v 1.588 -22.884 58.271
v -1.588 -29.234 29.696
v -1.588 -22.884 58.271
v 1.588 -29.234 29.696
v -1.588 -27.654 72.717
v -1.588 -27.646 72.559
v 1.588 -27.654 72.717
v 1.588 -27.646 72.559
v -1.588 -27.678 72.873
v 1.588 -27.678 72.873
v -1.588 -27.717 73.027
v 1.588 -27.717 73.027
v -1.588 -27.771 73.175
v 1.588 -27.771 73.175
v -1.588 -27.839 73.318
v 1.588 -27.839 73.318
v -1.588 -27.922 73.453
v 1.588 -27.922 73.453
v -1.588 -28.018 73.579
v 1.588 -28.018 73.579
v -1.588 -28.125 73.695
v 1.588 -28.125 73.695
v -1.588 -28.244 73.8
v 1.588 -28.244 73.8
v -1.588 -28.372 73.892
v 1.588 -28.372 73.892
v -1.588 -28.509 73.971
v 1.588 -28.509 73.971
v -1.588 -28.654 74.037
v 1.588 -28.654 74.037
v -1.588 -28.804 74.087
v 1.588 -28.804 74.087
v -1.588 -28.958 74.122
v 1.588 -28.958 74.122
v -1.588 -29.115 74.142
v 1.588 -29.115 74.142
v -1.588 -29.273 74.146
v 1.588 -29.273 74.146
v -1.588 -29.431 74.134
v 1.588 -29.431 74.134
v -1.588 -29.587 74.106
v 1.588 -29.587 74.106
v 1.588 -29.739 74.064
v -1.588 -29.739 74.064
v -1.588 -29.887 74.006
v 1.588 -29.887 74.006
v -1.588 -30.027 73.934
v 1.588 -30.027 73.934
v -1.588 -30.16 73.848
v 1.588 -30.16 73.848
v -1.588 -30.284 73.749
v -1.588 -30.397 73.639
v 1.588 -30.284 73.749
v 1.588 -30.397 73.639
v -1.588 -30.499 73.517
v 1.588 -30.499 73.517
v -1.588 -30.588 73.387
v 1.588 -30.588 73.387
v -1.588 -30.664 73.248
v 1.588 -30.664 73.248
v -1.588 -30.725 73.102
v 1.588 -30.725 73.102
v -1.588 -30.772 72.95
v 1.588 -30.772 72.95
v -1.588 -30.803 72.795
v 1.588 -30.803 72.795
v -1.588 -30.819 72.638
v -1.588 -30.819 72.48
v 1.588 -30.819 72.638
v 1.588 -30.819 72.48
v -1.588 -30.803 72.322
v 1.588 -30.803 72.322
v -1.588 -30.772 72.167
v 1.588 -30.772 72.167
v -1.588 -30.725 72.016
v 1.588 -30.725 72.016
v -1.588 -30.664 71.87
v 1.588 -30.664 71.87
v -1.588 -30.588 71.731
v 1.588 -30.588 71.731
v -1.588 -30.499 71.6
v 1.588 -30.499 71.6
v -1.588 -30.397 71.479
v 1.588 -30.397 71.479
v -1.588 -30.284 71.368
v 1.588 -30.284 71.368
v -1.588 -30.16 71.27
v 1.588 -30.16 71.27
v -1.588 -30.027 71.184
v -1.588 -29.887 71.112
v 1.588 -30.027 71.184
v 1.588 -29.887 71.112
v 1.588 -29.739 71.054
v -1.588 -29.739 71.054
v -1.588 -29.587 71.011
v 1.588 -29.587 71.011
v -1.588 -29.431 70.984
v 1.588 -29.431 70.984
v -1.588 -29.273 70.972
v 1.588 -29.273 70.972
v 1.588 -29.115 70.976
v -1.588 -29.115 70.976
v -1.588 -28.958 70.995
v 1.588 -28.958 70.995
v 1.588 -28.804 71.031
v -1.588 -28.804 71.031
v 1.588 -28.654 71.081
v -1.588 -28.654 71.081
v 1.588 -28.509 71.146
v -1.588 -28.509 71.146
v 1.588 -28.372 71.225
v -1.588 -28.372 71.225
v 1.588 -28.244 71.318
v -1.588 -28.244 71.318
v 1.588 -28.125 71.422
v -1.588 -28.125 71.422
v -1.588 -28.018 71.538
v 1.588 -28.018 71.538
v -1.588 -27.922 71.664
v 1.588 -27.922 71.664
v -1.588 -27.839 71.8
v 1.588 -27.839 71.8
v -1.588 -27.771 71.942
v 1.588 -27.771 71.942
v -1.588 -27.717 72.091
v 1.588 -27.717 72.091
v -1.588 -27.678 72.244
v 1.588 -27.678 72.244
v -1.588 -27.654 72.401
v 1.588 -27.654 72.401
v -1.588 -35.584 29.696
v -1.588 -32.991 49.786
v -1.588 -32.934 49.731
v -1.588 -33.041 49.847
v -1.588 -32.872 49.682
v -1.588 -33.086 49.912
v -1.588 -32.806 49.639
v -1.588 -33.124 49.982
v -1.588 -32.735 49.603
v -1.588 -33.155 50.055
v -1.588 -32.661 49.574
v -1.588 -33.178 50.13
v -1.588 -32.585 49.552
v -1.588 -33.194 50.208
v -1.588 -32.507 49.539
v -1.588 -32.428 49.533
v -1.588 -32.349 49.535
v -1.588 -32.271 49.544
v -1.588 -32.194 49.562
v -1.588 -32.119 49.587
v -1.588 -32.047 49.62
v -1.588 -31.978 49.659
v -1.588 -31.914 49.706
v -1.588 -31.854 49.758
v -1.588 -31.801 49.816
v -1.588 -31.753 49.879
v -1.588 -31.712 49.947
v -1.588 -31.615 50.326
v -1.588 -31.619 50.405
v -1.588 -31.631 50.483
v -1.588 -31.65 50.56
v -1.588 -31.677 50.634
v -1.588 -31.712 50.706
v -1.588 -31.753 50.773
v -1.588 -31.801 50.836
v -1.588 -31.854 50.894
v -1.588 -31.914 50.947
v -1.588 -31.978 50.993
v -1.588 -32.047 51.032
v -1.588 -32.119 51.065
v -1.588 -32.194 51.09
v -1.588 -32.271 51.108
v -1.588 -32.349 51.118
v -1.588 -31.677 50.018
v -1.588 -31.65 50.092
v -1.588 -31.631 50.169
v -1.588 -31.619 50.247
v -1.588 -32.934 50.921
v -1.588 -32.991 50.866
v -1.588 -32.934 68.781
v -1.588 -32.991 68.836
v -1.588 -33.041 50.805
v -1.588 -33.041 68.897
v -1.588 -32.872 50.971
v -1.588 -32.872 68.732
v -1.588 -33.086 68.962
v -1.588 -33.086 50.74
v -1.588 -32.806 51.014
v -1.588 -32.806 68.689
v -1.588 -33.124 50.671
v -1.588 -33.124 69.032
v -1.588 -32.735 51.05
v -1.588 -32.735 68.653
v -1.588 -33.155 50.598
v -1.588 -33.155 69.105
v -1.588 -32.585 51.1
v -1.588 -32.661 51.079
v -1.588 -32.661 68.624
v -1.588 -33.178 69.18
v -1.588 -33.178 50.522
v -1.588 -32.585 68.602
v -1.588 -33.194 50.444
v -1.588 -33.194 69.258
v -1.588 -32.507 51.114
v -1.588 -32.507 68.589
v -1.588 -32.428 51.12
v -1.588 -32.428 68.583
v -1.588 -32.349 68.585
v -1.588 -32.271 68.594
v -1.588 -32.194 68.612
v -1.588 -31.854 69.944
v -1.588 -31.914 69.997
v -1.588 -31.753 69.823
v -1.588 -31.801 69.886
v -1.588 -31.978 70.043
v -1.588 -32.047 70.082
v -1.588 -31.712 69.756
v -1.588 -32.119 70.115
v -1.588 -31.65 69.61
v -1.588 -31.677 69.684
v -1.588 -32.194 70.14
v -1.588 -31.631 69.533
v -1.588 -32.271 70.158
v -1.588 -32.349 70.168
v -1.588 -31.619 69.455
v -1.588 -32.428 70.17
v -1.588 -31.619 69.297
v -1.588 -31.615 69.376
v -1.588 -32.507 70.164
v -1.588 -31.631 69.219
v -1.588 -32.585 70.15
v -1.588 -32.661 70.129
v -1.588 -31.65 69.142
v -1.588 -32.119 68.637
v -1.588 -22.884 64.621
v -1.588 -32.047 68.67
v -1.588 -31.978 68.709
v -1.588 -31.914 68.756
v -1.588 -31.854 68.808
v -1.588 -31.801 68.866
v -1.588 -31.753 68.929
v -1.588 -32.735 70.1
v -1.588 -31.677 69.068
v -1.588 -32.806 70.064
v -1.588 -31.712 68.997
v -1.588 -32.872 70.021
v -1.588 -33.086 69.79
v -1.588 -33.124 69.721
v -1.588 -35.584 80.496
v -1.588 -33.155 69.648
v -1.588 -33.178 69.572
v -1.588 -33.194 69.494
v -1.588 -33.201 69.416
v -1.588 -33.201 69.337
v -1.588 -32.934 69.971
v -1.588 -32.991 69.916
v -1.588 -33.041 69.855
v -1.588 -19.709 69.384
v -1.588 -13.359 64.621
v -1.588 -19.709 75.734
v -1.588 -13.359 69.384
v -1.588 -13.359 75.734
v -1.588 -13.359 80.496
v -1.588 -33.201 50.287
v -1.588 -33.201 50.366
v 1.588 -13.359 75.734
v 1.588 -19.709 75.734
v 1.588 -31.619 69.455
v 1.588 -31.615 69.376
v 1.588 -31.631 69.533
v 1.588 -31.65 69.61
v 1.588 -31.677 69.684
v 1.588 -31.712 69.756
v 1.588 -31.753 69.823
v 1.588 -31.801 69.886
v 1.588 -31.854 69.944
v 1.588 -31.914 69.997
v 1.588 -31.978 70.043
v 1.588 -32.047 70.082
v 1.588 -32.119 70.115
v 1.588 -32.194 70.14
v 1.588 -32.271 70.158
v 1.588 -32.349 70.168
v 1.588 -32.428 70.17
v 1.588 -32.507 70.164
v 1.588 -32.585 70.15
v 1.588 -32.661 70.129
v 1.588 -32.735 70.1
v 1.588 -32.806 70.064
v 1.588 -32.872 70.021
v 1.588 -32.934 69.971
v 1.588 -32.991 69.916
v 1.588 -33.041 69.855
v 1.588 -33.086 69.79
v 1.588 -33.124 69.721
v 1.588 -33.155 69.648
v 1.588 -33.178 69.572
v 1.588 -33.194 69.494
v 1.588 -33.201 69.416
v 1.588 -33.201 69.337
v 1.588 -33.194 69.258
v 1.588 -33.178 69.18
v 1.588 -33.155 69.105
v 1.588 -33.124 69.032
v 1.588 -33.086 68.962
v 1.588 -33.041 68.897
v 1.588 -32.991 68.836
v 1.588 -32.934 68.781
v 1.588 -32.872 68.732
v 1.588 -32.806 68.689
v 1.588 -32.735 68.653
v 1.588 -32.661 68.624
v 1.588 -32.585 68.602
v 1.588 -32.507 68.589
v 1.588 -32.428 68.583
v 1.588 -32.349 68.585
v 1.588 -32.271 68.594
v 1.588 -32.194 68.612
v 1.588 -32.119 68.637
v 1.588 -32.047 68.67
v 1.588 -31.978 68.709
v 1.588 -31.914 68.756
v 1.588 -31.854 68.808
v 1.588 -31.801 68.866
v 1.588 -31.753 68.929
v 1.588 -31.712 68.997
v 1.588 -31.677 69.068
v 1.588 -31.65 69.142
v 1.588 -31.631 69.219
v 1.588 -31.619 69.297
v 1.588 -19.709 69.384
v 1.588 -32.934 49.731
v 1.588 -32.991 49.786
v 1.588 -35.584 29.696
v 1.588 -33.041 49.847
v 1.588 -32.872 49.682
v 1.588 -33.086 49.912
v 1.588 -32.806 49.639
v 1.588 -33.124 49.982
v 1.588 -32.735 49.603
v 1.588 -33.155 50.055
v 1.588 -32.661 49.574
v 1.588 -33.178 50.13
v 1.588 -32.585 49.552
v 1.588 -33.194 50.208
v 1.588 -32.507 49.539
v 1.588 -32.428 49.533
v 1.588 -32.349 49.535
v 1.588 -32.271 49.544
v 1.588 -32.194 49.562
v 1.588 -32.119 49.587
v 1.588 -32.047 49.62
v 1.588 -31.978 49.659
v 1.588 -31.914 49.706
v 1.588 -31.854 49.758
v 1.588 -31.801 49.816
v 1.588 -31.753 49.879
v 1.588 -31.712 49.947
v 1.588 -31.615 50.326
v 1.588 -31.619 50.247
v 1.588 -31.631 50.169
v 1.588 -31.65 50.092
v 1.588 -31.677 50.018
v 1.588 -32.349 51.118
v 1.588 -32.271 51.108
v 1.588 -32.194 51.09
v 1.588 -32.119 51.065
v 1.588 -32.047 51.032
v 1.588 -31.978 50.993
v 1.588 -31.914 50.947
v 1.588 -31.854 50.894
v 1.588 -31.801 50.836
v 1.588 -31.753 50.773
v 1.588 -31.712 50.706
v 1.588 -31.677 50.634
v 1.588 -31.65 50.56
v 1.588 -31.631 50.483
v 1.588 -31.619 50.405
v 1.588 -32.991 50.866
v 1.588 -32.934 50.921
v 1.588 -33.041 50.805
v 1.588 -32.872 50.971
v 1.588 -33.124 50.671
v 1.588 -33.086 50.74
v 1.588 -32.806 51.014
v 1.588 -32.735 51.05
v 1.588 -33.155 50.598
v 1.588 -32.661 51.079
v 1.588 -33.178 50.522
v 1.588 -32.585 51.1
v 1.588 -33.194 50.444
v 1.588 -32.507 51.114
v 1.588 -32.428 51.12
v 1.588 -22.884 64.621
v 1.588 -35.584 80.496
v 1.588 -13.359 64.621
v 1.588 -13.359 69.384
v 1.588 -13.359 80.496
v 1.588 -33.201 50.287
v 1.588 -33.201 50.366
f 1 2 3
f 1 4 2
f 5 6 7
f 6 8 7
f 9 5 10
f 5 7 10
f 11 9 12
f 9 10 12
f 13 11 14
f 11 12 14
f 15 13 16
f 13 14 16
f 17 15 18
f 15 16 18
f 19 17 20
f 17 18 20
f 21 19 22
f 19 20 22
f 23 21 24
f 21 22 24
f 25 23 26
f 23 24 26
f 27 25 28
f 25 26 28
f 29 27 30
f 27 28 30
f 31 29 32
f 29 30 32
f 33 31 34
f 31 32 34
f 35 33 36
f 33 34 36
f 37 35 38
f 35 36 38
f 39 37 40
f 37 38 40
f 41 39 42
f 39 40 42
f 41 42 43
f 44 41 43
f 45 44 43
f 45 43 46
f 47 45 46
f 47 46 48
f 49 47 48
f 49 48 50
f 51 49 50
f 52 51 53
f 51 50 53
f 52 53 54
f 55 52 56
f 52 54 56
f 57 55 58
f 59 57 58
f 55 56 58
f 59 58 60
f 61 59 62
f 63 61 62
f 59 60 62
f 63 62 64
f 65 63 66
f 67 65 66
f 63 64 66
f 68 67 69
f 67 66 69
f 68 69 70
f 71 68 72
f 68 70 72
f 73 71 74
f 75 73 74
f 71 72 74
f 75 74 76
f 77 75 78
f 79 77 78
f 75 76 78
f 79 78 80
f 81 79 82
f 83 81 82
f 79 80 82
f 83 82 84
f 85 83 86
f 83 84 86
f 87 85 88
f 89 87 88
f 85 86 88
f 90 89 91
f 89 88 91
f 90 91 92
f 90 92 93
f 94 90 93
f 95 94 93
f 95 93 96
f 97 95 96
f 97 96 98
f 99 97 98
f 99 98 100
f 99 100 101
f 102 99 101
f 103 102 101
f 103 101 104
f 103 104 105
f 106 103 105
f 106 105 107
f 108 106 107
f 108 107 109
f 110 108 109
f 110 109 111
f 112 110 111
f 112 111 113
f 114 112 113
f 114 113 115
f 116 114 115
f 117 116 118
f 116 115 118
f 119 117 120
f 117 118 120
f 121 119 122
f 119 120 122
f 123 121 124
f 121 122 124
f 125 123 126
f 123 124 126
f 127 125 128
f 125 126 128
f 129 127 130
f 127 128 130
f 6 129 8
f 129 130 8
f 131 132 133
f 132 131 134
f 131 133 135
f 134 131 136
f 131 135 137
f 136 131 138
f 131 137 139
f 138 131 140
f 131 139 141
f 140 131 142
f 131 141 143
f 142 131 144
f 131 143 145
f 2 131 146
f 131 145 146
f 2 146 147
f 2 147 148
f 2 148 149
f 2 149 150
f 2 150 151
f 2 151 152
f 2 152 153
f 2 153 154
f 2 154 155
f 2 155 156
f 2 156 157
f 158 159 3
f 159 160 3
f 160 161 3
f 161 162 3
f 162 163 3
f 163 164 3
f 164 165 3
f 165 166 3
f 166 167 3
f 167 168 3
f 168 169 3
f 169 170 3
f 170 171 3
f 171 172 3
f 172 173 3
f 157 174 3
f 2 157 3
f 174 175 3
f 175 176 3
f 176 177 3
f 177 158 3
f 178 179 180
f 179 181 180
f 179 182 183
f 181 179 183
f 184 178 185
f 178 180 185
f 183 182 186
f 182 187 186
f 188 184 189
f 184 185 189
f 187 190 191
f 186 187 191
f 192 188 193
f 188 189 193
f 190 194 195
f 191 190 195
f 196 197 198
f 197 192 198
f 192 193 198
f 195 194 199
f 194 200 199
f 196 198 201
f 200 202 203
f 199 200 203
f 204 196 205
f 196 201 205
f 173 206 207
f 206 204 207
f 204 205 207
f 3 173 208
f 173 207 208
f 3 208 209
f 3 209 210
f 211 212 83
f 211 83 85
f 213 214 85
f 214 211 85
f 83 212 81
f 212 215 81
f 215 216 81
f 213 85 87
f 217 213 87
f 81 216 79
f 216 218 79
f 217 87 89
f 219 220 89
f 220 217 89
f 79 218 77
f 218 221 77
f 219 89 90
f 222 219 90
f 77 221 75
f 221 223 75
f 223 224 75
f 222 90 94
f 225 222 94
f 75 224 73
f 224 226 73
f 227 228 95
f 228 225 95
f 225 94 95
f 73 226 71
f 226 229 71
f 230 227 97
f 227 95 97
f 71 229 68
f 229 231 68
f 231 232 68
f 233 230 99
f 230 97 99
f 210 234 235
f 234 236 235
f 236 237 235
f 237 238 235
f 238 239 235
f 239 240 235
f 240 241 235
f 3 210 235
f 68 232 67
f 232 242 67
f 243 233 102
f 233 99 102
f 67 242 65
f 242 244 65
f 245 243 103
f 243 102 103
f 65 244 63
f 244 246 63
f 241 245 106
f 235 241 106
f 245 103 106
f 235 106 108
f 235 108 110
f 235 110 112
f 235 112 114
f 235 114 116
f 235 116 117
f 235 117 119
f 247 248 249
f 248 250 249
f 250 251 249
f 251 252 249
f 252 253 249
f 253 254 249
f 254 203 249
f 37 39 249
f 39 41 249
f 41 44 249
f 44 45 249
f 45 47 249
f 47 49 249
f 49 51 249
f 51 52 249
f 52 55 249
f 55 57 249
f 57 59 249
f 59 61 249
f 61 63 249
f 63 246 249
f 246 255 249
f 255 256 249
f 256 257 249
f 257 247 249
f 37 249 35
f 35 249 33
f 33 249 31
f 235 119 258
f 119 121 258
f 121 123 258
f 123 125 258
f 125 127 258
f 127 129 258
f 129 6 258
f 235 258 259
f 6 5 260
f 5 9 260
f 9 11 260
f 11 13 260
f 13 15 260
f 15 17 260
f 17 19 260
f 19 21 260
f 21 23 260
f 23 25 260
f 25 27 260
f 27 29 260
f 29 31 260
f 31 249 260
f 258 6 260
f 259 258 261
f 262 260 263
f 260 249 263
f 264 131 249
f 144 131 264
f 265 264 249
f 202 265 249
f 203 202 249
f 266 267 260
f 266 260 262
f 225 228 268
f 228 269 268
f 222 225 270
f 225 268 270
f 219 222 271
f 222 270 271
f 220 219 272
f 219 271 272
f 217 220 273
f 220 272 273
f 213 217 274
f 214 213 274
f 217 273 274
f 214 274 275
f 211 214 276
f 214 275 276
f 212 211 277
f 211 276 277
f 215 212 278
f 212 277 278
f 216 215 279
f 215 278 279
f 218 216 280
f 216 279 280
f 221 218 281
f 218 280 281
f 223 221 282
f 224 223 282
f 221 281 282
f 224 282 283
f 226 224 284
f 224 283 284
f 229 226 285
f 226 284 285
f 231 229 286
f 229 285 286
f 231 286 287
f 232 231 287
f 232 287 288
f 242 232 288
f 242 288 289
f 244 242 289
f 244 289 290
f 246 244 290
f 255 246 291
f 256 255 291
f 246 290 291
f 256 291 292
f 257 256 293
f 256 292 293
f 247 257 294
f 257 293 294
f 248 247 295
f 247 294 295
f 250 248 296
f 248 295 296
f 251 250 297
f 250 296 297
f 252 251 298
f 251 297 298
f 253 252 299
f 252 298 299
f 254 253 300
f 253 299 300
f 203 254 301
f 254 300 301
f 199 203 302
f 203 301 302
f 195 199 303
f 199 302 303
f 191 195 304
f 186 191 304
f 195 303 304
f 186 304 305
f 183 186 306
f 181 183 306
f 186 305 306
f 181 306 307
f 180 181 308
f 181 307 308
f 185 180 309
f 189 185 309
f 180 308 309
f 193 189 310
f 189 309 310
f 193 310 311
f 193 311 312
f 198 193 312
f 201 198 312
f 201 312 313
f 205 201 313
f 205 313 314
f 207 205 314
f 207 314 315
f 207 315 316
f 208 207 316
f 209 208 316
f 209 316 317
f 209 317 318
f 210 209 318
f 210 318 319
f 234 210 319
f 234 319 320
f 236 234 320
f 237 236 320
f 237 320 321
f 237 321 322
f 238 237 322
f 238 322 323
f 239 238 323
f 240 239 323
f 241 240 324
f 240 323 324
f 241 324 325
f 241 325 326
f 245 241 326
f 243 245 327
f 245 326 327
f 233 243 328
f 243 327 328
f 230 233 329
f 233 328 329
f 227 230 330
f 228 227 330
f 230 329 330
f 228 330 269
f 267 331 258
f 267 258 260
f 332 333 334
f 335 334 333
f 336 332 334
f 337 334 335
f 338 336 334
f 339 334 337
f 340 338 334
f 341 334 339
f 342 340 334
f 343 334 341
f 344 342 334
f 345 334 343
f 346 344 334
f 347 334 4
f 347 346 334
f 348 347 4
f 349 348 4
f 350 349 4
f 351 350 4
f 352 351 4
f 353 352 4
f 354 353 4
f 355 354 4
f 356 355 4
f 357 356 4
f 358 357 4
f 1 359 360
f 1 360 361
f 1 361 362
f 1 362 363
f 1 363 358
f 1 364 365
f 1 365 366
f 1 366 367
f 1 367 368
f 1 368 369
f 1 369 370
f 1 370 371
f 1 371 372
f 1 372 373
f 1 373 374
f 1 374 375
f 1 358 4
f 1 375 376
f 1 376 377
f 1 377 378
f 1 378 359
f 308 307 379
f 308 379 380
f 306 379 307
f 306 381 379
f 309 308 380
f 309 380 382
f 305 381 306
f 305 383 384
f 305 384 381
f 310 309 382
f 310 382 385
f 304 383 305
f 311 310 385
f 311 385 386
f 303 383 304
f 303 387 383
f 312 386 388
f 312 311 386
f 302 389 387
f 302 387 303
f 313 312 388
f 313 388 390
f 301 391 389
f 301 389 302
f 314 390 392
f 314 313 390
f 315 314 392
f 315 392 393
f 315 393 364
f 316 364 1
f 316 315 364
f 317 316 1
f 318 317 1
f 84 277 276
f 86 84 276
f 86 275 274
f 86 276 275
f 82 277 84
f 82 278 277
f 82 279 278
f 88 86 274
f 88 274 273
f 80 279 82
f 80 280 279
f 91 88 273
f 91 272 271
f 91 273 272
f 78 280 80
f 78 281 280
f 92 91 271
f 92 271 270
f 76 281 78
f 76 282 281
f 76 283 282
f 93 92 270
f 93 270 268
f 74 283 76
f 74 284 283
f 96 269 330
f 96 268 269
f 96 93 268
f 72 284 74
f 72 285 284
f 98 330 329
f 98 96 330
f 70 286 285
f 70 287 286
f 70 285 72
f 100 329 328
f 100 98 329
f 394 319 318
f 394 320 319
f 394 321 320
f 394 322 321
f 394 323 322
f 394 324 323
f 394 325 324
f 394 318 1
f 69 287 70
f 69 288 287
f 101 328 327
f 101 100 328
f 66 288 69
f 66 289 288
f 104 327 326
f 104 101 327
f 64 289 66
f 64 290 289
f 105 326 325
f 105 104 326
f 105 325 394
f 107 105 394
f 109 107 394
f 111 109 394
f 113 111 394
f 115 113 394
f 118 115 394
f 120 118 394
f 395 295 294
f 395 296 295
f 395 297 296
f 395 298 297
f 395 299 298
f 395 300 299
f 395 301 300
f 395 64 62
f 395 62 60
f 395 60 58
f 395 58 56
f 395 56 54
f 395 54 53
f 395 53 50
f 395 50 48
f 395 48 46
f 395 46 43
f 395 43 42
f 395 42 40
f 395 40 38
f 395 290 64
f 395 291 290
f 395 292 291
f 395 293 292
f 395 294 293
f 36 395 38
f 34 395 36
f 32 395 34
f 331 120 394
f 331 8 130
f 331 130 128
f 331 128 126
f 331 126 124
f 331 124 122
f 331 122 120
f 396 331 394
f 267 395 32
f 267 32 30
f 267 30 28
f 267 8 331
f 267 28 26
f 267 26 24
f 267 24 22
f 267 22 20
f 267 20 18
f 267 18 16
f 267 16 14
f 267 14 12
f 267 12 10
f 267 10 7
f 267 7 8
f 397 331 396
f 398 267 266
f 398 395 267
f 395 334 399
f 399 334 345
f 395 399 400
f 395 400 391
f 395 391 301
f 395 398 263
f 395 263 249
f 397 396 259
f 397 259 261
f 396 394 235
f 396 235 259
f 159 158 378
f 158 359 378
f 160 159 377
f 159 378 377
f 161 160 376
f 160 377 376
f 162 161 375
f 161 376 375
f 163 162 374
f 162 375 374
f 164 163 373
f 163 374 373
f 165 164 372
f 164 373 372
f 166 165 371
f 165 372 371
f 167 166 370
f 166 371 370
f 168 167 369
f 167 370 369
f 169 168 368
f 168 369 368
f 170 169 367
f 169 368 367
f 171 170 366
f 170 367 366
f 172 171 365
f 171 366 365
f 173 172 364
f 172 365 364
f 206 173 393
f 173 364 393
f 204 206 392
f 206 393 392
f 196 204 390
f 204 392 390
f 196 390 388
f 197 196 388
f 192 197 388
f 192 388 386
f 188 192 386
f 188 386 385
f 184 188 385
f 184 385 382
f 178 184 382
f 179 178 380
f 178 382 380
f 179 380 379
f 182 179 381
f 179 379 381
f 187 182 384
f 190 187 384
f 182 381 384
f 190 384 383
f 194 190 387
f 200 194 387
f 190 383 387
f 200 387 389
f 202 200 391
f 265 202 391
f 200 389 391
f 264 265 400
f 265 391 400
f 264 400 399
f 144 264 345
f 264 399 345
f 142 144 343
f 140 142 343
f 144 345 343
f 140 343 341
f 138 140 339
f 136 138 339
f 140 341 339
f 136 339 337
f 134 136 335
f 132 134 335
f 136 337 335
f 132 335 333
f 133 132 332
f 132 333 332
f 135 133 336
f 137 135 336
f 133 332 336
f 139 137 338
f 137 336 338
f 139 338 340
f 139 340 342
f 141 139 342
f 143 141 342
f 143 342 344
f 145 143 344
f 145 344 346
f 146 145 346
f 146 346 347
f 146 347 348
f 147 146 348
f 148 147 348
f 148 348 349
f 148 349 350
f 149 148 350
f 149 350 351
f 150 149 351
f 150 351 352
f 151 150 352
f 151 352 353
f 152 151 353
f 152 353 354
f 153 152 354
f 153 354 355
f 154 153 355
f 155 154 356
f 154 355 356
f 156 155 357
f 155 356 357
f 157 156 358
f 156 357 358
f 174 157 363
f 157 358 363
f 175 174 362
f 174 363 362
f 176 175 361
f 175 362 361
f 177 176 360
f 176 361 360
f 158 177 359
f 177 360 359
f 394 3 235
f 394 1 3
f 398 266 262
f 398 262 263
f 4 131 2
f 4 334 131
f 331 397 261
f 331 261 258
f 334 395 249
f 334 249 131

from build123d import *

# Parameters (mm, degrees)
F2_DEPTH = 1.5875
F1_R     = 1.5875
F1_R_2   = 0.79375
F3_DEPTH = 12.7


with BuildPart() as f2:
    # F0 (on Right) → F2 (new body, symmetric)
    with BuildSketch(Plane.YZ):
        Polygon((-22.883659, 58.271262), (-22.883659, 64.621262), (-13.358659, 64.621262), (-13.358659, 69.383762), (-19.708659, 69.383762), (-19.708659, 75.733762), (-13.358659, 75.733762), (-13.358659, 80.496262), (-35.583659, 80.496262), (-35.583659, 29.696262), (-29.233659, 29.696262), align=None)
    extrude(amount=F2_DEPTH, both=True)

    # F1 (on Right) → F3 (cut, symmetric)
    with BuildSketch(Plane.YZ):
        with Locations((-29.233659, 72.558762)):
            Circle(F1_R)
        with Locations((-32.408659, 50.326142)):
            Circle(F1_R_2)
        with Locations((-32.408659, 69.376142)):
            Circle(F1_R_2)
    extrude(amount=F3_DEPTH, both=True, mode=Mode.SUBTRACT)


solid = f2.part
